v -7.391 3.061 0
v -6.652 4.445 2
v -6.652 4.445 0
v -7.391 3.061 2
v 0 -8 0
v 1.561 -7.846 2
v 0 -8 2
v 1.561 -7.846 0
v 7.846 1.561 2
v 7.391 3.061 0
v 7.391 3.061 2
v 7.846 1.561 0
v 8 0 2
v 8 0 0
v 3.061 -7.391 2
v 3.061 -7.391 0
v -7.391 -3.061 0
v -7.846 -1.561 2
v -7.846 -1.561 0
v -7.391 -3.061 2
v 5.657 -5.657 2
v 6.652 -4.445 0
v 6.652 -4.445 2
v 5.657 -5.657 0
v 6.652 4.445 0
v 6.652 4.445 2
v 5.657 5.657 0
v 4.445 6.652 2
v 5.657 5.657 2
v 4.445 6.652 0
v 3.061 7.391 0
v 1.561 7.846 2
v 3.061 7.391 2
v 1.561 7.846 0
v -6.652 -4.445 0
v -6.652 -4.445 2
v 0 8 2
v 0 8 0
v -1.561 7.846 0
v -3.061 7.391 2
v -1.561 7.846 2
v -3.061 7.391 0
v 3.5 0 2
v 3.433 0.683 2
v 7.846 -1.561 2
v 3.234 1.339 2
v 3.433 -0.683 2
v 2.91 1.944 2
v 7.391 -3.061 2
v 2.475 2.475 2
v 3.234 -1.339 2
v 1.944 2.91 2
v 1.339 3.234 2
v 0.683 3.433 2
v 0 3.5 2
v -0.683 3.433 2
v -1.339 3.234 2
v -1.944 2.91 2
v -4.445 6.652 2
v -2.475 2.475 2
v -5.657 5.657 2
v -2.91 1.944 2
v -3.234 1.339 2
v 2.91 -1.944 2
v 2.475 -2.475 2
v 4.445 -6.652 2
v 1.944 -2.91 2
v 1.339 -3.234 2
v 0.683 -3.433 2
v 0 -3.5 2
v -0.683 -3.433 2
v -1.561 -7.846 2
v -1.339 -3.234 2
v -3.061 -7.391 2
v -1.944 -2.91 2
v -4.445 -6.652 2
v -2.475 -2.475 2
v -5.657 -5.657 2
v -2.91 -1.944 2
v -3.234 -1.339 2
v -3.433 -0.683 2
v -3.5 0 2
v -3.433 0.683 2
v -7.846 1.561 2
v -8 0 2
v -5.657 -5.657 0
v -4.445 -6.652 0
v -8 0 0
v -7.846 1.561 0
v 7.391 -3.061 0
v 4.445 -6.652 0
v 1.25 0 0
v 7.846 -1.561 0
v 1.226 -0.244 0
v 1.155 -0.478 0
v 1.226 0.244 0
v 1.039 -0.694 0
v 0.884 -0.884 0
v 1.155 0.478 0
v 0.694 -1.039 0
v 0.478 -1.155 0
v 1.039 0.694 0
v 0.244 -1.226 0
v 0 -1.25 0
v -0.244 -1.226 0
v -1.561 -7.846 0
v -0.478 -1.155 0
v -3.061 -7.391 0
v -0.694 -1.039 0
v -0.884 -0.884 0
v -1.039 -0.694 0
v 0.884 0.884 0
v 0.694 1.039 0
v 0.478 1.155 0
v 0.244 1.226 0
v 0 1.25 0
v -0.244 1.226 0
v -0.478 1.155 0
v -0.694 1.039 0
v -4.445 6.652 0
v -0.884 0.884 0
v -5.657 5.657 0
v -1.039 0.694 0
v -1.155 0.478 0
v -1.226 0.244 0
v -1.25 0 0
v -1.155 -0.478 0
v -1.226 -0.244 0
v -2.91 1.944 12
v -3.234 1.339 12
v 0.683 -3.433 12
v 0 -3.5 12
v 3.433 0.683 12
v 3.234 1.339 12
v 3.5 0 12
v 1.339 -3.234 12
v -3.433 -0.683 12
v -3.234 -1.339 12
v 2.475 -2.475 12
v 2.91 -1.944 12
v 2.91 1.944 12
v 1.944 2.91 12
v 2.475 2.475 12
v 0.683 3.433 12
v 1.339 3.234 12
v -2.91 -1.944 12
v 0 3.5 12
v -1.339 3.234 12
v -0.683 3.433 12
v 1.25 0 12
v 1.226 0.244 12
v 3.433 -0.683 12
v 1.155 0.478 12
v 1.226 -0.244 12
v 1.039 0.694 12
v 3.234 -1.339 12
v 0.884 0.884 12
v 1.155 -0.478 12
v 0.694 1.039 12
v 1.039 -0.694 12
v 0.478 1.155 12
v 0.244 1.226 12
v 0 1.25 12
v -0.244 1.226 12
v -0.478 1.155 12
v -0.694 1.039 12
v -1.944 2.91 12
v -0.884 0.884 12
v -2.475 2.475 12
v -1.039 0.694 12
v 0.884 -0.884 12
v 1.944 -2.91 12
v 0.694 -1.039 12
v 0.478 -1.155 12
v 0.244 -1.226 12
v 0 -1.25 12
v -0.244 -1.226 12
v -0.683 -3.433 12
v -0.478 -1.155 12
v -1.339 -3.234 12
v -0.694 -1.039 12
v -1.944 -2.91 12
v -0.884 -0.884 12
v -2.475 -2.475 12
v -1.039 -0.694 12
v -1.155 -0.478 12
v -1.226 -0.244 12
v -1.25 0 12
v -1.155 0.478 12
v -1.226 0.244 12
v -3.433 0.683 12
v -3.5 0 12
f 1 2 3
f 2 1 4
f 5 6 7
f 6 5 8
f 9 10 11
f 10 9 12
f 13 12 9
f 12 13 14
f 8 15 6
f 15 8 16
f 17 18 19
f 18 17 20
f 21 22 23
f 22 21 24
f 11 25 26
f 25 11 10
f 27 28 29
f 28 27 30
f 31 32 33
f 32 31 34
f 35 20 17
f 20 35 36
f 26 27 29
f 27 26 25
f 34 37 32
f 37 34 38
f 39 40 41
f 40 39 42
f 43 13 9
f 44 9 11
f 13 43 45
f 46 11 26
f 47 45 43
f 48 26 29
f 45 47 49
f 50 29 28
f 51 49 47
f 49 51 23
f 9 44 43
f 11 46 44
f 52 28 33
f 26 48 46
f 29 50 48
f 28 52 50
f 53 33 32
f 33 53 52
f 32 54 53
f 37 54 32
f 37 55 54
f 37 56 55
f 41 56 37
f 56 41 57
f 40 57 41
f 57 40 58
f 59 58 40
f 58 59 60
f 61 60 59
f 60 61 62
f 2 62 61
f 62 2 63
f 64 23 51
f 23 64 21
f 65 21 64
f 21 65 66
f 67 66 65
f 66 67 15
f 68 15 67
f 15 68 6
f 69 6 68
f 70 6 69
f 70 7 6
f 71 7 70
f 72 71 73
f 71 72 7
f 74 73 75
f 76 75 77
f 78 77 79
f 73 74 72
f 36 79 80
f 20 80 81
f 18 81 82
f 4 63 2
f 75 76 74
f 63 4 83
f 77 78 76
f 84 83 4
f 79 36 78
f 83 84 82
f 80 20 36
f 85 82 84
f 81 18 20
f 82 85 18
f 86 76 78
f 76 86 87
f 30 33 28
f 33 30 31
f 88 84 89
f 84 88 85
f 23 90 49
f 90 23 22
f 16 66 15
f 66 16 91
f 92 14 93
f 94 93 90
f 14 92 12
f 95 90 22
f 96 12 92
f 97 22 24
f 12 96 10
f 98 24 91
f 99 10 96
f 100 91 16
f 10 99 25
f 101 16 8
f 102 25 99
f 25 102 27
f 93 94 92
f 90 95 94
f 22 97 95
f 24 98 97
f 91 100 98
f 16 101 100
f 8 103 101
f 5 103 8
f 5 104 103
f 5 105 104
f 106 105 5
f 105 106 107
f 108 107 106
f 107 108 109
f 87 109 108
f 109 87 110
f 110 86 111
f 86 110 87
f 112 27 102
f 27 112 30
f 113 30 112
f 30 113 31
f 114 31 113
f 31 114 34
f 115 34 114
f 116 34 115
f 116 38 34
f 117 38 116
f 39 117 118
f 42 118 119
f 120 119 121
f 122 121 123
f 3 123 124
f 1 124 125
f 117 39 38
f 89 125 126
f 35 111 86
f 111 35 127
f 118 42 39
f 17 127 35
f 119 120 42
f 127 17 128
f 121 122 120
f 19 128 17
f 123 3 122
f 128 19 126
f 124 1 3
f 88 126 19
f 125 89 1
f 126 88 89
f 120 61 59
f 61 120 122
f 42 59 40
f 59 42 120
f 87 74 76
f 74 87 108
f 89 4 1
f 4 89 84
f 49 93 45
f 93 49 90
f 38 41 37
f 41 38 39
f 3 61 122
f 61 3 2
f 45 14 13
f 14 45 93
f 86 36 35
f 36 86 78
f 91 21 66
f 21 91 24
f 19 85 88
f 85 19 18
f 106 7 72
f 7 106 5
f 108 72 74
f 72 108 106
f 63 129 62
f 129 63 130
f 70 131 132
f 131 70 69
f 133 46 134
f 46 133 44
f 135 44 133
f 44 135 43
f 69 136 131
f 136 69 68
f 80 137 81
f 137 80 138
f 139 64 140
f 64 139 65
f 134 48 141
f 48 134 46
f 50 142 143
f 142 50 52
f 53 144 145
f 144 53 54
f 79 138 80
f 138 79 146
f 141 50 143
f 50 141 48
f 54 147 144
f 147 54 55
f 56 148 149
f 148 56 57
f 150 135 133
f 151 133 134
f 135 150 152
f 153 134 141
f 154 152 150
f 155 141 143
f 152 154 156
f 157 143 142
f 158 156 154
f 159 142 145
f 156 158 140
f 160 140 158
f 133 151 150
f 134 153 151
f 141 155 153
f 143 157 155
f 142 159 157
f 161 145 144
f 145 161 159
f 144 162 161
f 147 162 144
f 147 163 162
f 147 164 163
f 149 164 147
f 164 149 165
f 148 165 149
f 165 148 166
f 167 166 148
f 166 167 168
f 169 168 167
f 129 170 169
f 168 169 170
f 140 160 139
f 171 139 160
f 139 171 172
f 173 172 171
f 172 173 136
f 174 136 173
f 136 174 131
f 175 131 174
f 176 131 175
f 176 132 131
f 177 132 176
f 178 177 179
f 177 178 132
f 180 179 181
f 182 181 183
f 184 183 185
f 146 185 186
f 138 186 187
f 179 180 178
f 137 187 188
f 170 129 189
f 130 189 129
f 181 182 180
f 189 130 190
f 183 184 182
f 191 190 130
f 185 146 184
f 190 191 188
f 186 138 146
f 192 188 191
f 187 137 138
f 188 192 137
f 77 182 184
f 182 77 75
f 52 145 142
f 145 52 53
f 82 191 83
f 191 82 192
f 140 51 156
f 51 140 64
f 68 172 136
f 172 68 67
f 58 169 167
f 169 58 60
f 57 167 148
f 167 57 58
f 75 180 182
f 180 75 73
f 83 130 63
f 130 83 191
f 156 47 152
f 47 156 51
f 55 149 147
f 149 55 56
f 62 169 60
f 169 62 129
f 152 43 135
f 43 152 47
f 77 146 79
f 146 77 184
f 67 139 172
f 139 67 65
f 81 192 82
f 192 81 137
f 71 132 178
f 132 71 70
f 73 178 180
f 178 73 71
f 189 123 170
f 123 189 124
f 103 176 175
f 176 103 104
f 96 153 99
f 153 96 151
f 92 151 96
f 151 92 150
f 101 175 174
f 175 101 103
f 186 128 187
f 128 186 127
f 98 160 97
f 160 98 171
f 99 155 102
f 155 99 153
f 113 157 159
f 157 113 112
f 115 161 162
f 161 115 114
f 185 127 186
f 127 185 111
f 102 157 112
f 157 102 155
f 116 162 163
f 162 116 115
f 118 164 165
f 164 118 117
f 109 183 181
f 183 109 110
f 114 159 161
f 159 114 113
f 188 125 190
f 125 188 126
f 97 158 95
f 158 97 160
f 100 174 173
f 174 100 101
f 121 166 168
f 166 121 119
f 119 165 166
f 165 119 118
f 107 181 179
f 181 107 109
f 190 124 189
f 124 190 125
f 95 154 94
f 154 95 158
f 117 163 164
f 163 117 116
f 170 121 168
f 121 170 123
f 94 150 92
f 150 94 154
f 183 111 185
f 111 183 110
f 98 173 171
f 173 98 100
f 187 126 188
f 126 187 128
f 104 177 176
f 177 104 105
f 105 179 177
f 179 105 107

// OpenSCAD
$fn = 32;

// ----------------------------------------------------------------------
// Micro post: flanged post, 5-20 mm class
// ----------------------------------------------------------------------

// --- parameters (mm) ---
post_d = 7;               // post diameter
post_h = 10;              // post height above the flange
flange_d = 16;            // flange diameter
flange_t = 2;             // flange thickness
bore_d = 2.5;             // through bore

total_h = post_h + flange_t;  // overall height

difference() {
  union() {
    cylinder(h = flange_t, d = flange_d);
    translate([0, 0, flange_t]) cylinder(h = post_h, d = post_d);
  }
  translate([0, 0, -1]) cylinder(h = total_h + 2, d = bore_d);
}
